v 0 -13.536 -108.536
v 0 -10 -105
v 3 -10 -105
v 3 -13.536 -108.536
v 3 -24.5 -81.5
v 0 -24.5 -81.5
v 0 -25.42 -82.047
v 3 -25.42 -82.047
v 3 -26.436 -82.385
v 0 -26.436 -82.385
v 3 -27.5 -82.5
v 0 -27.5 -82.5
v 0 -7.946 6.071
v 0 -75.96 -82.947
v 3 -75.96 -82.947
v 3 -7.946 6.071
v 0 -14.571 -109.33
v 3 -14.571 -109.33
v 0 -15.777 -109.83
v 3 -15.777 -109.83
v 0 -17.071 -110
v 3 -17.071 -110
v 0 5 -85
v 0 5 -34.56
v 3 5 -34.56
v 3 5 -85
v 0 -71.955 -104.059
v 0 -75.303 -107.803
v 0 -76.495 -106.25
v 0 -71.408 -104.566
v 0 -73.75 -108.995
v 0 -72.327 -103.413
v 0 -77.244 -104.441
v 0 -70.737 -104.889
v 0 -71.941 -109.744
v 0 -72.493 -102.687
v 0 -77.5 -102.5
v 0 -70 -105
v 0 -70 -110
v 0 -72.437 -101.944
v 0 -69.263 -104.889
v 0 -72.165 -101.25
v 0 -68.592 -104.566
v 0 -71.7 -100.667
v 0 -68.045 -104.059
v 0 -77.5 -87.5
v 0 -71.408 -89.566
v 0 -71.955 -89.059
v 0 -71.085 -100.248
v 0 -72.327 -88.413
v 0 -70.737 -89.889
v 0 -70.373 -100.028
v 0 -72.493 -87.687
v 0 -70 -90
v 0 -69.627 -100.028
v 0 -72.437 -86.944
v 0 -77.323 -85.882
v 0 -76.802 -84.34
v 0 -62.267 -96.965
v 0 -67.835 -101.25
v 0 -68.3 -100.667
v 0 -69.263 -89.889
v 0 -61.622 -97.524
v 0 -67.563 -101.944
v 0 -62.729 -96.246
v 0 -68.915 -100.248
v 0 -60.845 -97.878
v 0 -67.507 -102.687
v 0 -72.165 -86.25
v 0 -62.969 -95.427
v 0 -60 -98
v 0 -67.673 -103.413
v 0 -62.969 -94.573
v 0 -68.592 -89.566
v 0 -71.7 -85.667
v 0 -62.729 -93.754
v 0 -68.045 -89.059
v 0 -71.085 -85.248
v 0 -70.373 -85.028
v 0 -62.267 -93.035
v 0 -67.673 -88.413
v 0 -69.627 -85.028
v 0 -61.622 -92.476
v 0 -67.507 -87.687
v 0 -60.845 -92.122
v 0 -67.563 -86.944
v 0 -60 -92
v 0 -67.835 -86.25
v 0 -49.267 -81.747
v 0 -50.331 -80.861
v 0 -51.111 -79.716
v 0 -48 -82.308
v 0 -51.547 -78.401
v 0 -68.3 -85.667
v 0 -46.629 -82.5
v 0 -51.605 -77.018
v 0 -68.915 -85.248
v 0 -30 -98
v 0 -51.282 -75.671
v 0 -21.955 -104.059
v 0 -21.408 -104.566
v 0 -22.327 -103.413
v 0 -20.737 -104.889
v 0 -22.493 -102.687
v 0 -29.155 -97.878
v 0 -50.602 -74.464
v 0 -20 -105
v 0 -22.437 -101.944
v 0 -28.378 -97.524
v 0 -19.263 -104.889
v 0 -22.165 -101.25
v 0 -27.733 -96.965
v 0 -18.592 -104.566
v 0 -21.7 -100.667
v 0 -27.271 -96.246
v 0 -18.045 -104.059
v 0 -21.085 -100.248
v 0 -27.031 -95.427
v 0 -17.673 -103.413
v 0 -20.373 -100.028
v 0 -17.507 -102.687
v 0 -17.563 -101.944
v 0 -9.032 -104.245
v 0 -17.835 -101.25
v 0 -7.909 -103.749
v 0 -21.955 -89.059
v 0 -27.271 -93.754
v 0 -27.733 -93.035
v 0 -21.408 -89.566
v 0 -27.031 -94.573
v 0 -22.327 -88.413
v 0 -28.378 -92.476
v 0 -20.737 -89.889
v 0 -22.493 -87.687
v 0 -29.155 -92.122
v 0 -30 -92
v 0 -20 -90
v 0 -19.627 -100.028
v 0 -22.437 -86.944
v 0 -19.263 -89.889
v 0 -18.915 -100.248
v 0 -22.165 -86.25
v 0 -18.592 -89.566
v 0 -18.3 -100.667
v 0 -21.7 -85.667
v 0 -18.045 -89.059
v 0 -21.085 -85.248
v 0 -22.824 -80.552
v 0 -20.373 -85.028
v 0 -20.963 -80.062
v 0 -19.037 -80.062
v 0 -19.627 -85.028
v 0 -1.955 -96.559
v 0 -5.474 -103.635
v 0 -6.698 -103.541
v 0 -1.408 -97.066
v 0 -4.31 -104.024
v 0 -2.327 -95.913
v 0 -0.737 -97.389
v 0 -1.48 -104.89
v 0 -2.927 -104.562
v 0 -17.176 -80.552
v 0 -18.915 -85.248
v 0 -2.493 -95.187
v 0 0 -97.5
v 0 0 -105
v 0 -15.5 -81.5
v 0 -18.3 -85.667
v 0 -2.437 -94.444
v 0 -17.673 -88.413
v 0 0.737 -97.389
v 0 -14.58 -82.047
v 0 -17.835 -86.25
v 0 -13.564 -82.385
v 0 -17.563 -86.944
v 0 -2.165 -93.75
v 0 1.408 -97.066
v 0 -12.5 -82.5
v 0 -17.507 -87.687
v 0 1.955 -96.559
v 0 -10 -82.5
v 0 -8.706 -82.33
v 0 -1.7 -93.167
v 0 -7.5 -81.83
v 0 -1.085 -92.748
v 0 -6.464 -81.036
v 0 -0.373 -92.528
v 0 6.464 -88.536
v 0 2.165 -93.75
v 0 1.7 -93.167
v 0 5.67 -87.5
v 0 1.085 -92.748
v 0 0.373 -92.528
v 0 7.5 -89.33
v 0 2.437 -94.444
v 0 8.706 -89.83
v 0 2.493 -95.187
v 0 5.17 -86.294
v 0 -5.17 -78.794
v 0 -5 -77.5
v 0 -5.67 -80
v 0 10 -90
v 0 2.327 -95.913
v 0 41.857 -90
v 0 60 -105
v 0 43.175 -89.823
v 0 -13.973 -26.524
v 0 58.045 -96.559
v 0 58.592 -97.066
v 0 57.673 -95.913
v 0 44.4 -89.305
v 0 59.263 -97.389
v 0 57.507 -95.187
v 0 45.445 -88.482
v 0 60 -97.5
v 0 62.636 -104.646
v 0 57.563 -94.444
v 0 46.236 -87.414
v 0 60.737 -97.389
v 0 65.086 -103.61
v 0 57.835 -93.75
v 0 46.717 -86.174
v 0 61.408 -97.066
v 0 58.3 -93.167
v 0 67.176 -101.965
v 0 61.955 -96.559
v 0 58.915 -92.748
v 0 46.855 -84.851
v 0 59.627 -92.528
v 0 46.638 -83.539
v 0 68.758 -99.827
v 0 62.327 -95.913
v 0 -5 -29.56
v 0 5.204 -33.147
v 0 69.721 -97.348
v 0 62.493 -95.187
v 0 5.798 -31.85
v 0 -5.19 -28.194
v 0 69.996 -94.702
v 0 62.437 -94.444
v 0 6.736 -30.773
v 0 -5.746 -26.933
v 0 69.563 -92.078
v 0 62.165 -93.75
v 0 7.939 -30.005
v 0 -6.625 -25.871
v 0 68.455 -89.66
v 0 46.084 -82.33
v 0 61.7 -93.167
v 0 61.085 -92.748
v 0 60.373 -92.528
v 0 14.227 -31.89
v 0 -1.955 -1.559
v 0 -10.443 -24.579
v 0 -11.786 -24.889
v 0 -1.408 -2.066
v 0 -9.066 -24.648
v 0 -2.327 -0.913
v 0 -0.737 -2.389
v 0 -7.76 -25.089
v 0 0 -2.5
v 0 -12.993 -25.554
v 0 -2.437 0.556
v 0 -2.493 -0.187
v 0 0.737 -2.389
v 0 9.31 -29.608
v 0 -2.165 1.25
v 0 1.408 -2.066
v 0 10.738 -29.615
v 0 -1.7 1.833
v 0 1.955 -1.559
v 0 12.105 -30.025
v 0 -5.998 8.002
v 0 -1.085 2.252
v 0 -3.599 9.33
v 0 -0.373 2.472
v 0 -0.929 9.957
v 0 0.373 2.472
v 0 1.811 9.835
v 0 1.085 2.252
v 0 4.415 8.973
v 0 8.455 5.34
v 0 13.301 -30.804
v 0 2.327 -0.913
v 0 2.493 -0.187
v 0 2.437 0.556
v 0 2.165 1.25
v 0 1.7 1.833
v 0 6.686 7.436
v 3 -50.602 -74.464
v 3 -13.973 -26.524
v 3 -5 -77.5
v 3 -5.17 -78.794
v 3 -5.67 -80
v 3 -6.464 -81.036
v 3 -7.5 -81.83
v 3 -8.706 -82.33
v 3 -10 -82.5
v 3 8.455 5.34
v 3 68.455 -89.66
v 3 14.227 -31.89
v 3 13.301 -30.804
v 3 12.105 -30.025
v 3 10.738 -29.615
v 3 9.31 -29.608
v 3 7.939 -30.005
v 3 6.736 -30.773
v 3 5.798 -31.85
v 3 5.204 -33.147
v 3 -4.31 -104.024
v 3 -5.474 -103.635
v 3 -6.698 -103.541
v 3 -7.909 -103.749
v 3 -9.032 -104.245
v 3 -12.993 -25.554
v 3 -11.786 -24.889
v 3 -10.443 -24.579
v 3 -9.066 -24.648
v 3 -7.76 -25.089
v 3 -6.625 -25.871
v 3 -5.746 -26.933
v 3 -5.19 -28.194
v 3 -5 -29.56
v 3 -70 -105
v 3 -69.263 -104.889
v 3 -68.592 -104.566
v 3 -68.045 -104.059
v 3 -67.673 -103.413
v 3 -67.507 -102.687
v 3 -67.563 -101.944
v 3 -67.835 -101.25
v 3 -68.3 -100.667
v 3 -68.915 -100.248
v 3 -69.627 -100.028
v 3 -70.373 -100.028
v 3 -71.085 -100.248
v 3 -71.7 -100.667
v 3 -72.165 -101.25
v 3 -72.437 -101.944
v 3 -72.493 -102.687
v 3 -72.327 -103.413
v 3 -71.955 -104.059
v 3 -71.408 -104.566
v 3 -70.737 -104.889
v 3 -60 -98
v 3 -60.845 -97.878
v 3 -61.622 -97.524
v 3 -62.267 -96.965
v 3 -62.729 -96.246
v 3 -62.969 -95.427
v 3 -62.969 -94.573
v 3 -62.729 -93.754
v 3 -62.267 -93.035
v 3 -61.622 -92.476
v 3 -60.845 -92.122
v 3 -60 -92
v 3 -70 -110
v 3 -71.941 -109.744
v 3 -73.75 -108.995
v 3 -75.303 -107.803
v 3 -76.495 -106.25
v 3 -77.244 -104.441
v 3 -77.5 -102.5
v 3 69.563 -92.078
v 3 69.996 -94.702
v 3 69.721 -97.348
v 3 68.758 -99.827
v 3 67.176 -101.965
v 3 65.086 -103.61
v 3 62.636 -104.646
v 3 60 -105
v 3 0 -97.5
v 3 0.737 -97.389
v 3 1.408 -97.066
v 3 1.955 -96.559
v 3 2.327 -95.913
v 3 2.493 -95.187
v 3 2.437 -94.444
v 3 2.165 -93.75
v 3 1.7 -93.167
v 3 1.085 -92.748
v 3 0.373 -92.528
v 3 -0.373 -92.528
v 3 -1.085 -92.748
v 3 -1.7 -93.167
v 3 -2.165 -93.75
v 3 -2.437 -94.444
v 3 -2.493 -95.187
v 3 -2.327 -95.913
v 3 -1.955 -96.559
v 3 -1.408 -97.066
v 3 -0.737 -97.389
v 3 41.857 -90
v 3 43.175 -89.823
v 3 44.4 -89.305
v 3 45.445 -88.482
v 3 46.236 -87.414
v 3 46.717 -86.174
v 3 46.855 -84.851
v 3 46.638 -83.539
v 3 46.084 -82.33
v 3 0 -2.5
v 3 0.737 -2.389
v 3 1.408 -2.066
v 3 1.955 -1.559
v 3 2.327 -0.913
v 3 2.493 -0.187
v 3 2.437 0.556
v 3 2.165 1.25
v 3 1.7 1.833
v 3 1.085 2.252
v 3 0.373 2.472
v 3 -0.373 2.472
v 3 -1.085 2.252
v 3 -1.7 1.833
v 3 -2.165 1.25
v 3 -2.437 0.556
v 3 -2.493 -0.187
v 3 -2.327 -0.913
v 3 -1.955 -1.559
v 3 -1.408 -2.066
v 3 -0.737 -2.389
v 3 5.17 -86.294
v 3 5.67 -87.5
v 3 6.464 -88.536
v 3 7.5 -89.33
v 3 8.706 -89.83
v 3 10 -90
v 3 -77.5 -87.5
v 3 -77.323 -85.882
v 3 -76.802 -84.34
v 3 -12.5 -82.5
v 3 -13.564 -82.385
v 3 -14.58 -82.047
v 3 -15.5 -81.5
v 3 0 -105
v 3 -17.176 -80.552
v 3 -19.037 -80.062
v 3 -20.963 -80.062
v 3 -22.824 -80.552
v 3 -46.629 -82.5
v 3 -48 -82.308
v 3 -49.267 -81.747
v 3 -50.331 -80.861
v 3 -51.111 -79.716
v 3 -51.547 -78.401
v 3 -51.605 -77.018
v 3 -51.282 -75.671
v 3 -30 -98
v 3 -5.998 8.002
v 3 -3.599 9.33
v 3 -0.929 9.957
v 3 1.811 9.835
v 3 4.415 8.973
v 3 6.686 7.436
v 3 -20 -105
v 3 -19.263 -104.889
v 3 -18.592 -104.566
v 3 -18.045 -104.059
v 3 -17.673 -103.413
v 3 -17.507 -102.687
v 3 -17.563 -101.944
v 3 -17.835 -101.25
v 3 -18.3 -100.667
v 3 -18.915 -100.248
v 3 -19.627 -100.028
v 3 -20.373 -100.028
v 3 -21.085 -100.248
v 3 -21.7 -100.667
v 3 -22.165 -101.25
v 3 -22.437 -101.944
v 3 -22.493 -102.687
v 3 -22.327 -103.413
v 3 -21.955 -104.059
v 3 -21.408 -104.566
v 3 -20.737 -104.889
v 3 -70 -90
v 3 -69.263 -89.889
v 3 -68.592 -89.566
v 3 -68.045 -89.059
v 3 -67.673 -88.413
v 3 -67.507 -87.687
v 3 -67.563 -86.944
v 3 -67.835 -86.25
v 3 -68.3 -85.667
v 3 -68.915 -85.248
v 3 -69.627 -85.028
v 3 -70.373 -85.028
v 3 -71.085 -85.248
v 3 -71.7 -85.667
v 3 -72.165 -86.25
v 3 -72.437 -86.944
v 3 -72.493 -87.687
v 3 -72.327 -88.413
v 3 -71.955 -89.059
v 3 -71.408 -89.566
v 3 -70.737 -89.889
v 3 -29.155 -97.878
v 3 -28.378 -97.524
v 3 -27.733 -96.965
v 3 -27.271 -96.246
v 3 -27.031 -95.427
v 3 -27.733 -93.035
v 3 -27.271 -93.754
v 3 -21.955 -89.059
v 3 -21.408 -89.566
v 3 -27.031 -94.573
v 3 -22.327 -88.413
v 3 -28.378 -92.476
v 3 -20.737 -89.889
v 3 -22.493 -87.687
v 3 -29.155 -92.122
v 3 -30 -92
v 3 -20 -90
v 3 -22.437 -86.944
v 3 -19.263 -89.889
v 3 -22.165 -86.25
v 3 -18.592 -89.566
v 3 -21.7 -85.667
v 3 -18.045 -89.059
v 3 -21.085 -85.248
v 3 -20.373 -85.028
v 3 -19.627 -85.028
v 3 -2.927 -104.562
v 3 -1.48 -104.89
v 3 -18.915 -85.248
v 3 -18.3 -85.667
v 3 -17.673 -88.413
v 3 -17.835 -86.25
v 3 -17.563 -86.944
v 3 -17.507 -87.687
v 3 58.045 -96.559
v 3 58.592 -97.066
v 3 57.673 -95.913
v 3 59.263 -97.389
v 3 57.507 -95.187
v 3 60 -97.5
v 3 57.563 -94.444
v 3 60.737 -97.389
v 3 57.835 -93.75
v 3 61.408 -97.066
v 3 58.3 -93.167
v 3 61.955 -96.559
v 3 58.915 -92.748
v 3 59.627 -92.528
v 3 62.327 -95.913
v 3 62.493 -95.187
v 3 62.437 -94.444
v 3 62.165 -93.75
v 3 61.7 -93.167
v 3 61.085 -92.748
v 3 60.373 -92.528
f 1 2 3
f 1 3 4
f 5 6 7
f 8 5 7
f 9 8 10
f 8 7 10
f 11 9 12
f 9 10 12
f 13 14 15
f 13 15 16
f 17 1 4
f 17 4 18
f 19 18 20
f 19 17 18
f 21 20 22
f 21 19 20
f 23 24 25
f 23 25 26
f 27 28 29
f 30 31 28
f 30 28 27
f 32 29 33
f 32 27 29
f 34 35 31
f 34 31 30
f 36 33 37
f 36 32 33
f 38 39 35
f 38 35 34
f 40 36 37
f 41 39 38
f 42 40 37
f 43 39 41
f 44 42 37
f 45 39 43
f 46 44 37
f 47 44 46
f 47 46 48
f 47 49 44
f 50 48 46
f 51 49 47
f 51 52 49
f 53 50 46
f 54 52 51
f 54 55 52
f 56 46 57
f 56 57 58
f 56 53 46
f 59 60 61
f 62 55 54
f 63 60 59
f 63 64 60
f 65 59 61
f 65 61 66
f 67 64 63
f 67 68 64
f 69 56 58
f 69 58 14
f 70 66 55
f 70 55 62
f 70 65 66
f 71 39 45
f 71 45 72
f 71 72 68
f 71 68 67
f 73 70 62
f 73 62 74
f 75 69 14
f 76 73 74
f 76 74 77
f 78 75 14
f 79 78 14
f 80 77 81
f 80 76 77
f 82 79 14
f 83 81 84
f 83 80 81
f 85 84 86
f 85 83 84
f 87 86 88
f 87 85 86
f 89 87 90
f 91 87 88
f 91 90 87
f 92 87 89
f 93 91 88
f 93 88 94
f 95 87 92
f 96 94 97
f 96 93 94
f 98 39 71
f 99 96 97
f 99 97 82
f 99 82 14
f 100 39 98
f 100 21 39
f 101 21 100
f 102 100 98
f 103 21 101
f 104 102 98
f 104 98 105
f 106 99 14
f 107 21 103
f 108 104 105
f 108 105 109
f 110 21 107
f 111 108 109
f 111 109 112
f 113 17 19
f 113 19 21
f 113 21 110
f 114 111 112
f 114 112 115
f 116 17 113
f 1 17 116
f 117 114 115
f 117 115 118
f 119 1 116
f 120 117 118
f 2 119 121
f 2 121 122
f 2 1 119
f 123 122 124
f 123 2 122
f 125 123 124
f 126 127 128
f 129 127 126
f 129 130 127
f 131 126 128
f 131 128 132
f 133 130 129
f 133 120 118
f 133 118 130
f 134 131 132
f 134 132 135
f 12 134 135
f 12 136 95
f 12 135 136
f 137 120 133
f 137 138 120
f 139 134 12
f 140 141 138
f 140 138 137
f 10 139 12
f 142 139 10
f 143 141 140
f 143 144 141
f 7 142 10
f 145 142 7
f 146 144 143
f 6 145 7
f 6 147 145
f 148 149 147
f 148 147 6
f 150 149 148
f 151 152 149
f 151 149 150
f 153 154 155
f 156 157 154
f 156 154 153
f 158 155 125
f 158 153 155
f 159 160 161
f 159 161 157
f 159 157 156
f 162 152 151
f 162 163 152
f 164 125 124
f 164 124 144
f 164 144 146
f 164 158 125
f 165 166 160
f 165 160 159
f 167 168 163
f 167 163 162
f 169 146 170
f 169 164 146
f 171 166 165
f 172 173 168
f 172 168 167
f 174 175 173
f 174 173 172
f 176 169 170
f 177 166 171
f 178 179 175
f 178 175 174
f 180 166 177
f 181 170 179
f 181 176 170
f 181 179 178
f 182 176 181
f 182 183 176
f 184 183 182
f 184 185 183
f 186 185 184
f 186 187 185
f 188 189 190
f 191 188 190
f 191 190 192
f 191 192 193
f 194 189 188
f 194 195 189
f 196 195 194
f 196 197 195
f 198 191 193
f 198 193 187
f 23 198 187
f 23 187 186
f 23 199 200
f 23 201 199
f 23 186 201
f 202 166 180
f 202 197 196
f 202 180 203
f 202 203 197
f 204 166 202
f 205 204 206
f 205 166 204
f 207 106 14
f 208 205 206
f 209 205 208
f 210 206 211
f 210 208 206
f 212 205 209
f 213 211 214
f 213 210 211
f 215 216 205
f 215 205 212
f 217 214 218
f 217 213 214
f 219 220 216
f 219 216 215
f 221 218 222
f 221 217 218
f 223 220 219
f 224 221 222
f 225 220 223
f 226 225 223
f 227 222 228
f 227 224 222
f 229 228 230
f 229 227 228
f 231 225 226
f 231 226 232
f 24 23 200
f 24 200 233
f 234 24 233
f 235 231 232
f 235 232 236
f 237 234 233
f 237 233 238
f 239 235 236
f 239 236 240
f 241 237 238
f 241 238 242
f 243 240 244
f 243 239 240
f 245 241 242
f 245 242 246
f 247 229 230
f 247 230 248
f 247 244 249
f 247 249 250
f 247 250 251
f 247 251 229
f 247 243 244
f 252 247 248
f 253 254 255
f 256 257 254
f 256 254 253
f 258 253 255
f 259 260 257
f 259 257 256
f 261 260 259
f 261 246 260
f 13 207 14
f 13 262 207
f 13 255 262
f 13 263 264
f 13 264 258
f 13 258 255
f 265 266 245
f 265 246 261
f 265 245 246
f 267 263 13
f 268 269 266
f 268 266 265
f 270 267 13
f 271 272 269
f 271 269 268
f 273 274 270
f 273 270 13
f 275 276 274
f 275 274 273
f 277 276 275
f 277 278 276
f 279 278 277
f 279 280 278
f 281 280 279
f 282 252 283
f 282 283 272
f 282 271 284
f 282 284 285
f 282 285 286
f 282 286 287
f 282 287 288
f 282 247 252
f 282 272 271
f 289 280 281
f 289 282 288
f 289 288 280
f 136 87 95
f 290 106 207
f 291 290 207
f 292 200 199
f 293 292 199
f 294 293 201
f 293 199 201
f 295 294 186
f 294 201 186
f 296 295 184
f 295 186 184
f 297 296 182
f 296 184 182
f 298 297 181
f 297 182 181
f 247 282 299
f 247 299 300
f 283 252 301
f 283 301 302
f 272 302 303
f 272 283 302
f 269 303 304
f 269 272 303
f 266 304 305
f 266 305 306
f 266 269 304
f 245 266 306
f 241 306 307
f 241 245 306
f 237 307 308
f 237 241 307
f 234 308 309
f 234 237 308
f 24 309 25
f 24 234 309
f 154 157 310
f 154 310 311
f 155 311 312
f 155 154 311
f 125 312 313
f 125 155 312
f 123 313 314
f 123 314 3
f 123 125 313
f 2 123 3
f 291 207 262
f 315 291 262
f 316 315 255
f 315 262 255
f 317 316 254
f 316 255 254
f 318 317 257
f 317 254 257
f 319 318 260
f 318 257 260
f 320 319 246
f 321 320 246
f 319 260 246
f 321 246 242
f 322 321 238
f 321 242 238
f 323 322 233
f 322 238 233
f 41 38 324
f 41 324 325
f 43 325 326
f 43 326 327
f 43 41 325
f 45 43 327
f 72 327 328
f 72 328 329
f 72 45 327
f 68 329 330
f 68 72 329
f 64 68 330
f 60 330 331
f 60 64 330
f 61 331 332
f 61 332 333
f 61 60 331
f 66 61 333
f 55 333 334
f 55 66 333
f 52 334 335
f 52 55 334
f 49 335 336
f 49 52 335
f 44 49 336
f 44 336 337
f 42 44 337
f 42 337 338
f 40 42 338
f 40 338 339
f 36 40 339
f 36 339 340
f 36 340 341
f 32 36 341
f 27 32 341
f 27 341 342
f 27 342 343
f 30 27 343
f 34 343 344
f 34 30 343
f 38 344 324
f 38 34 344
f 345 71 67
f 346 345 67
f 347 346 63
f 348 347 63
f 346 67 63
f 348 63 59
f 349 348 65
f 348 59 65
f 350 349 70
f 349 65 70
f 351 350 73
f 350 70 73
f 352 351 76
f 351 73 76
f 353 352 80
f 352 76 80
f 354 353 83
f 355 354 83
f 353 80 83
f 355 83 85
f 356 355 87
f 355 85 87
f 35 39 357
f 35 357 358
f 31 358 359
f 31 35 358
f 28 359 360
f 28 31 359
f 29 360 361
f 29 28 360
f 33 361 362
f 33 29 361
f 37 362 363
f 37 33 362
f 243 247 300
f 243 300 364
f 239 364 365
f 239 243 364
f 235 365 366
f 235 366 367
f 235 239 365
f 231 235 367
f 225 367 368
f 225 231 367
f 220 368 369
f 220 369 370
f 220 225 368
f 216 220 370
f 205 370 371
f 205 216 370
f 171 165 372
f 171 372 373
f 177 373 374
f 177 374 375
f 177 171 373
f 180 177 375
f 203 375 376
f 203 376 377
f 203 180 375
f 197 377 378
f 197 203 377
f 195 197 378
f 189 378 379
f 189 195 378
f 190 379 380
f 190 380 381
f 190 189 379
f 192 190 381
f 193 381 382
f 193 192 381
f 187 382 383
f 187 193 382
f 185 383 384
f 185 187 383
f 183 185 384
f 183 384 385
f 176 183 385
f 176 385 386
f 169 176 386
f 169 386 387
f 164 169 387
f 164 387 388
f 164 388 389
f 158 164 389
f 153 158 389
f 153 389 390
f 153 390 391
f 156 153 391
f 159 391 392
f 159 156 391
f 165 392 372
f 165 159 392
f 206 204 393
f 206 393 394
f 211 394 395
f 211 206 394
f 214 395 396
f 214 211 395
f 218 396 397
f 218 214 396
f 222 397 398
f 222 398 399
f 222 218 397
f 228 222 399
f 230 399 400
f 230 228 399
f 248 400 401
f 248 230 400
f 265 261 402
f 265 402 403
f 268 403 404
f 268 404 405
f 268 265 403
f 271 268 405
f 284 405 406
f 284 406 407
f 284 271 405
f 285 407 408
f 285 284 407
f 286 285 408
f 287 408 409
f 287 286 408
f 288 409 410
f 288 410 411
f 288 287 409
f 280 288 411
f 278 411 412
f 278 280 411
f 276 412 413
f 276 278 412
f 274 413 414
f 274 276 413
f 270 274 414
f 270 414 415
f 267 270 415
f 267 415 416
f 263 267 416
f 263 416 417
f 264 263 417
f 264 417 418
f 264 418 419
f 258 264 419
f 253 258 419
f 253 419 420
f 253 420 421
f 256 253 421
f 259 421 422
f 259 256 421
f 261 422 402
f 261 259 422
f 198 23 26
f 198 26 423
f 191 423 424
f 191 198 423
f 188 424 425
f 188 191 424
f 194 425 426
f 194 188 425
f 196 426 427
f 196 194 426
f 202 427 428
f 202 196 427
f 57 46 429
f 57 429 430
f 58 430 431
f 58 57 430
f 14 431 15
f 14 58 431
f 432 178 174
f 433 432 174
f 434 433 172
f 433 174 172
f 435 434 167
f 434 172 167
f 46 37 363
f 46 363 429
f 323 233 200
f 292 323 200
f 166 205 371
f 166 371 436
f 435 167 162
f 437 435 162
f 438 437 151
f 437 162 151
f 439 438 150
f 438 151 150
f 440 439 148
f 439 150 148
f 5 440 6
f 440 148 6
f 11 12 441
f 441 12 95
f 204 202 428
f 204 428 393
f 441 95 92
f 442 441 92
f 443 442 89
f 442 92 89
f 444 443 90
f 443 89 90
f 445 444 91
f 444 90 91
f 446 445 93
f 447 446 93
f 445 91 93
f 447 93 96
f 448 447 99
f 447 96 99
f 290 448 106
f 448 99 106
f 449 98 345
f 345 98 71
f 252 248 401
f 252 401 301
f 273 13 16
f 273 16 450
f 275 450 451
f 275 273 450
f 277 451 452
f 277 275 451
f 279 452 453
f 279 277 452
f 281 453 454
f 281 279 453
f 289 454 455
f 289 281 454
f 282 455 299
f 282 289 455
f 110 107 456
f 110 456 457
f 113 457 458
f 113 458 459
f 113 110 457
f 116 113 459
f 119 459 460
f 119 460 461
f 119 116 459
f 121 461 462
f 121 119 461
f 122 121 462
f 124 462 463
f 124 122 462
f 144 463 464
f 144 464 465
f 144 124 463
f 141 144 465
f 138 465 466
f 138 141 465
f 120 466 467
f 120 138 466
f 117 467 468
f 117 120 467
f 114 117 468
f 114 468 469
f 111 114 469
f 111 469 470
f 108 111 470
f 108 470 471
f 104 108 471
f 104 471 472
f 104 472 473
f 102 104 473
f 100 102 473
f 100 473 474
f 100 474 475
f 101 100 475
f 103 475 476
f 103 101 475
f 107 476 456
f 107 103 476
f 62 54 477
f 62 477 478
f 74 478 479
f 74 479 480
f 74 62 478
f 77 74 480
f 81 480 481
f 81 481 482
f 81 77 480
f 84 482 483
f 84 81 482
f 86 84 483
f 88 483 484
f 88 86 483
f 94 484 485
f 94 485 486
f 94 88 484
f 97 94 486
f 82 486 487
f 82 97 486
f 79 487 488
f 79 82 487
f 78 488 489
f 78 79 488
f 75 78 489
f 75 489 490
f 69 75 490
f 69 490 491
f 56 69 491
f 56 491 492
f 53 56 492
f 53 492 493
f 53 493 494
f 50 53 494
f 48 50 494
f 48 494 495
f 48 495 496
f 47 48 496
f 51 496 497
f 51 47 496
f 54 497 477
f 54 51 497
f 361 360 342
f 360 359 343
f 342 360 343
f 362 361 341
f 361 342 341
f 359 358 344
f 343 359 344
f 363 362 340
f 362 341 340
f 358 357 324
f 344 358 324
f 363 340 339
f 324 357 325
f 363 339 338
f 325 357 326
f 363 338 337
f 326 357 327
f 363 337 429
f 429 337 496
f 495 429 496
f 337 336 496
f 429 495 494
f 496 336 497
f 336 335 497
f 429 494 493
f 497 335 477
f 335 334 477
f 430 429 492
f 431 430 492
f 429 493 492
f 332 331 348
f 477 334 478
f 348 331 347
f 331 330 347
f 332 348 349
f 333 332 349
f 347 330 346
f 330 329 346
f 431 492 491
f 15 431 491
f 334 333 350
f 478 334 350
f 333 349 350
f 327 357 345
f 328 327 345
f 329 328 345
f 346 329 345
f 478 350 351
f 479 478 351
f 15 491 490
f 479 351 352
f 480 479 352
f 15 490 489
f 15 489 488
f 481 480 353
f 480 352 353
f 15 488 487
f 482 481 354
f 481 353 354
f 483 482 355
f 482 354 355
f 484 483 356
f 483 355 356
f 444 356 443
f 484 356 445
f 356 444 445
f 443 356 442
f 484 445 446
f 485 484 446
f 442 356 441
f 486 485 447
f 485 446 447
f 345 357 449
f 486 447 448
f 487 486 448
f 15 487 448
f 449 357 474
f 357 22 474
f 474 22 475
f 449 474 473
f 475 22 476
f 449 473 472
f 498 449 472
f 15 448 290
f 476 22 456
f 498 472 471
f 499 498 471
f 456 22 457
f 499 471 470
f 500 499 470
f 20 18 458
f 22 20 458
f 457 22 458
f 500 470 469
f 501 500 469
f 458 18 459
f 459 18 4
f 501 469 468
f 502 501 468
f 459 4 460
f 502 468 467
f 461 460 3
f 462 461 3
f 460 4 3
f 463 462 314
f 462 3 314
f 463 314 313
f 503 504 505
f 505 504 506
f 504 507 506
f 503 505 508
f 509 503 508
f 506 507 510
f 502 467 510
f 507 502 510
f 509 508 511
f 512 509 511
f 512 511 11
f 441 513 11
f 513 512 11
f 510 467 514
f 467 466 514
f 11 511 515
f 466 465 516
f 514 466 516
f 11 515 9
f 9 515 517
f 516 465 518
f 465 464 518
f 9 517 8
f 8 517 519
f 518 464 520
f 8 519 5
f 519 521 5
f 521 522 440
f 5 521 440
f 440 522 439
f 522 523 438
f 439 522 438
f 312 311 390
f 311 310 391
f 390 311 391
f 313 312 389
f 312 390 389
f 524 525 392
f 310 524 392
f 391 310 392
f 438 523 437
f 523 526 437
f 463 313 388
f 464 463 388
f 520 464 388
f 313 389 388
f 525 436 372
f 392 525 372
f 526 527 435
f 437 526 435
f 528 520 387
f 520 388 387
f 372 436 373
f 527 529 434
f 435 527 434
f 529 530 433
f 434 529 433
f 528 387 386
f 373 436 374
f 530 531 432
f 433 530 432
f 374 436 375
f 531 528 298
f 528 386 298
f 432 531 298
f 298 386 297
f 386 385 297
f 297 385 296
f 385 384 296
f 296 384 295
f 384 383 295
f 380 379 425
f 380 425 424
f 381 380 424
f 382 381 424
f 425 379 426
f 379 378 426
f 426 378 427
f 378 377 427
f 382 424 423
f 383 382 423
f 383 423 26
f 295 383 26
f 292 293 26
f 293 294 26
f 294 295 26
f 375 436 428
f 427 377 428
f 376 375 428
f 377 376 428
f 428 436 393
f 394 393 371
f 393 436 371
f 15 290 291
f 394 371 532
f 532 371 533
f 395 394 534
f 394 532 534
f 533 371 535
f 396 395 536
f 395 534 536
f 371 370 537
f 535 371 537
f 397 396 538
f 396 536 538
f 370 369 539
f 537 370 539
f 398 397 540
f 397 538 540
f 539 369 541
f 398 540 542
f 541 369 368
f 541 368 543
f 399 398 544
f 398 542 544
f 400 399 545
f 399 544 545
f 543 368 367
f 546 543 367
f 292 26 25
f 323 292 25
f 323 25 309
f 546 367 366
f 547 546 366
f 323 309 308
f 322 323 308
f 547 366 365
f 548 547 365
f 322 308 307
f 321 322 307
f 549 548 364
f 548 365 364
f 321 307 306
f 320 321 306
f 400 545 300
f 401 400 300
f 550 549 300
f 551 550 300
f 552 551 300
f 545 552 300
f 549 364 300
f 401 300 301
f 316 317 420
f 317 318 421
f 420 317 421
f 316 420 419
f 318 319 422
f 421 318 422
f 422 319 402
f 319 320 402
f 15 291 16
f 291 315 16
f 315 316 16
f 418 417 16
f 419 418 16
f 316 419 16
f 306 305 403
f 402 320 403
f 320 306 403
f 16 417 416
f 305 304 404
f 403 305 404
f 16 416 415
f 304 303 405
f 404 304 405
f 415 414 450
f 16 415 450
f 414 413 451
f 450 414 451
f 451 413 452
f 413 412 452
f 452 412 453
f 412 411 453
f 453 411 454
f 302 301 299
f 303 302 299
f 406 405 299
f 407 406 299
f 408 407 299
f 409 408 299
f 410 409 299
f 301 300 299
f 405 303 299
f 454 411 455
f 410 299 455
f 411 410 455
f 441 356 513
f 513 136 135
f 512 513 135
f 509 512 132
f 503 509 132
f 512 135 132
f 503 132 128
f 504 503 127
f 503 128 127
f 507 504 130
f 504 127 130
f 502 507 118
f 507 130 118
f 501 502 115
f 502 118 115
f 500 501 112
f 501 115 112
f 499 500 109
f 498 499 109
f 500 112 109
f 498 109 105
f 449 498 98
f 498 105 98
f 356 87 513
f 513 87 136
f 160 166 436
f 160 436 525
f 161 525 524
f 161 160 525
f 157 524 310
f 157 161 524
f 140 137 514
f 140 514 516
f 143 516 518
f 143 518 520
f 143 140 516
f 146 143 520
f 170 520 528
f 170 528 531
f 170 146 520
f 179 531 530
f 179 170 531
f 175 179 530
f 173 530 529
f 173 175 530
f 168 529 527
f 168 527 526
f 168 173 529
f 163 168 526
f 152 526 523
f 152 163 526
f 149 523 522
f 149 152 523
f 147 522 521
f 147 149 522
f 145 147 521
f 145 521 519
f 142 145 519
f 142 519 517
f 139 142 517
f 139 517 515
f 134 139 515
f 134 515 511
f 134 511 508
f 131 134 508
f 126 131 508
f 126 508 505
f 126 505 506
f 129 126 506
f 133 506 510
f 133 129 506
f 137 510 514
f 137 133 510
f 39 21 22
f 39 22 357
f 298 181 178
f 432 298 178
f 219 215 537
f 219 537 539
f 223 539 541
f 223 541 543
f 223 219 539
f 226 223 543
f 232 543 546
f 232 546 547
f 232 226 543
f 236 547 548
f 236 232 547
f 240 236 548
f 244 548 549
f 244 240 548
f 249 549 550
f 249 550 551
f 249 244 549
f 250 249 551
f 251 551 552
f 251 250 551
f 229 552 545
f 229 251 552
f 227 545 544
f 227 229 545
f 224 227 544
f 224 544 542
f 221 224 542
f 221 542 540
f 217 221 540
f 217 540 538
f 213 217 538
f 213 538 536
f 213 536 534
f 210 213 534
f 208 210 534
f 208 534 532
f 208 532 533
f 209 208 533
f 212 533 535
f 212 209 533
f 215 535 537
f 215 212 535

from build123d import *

# Parameters (mm, degrees)
SKETCH_1_R      = 2.5
EXTRUDE_1_DEPTH = 3


with BuildPart() as part:
    # 草图1 → 凸台-拉伸1 (new body)
    with BuildSketch(Plane(origin=(0, 0, 0), x_dir=(0, 0, -1), z_dir=(1, 0, 0))):
        with BuildLine():
            Line((-5.339929914, 8.45488903), (89.660070086, 68.45488903))
            ThreePointArc((89.660070086, 68.45488903), (99.827043653, 68.757833612), (105, 60))
            Line((105, 60), (105, 0))
            ThreePointArc((105, 0), (104.752868622, -2.209423827), (104.023689271, -4.309644063))
            ThreePointArc((104.023689271, -4.309644063), (103.607541108, -7.309975988), (105, -10))
            Line((105, -10), (108.535533906, -13.535533906))
            ThreePointArc((108.535533906, -13.535533906), (109.619397663, -15.15765065), (110, -17.071067812))
            Line((110, -17.071067812), (110, -70))
            ThreePointArc((110, -70), (107.803300859, -75.303300859), (102.5, -77.5))
            Line((102.5, -77.5), (87.5, -77.5))
            ThreePointArc((87.5, -77.5), (85.096555547, -77.10446724), (82.946615365, -75.959587936))
            Line((82.946615365, -75.959587936), (-6.071179513, -7.946117248))
            ThreePointArc((-6.071179513, -7.946117248), (-9.990075391, 0.44541405), (-5.339929914, 8.45488903))
        make_face()
        Circle(SKETCH_1_R, mode=Mode.SUBTRACT)
        with Locations((95, 0)):
            Circle(SKETCH_1_R, mode=Mode.SUBTRACT)
        with Locations((95, 60)):
            Circle(SKETCH_1_R, mode=Mode.SUBTRACT)
        with Locations((87.5, -20)):
            Circle(SKETCH_1_R, mode=Mode.SUBTRACT)
        with Locations((102.5, -20)):
            Circle(SKETCH_1_R, mode=Mode.SUBTRACT)
        with Locations((87.5, -70)):
            Circle(SKETCH_1_R, mode=Mode.SUBTRACT)
        with Locations((102.5, -70)):
            Circle(SKETCH_1_R, mode=Mode.SUBTRACT)
        with BuildLine():
            Line((82.330035043, 46.084178697), (31.890205922, 14.227444515))
            ThreePointArc((31.890205922, 14.227444515), (29.757191461, 8.610255883), (34.560170879, 5))
            Line((34.560170879, 5), (85, 5))
            ThreePointArc((85, 5), (88.535533906, 6.464466094), (90, 10))
            Line((90, 10), (90, 41.856734182))
            ThreePointArc((90, 41.856734182), (87.413521827, 46.235650988), (82.330035043, 46.084178697))
        make_face(mode=Mode.SUBTRACT)
        with BuildLine():
            Line((29.559523335, -5), (77.5, -5))
            ThreePointArc((77.5, -5), (81.035533906, -6.464466094), (82.5, -10))
            Line((82.5, -10), (82.5, -12.5))
            ThreePointArc((82.5, -12.5), (82.24341649, -14.08113883), (81.5, -15.5))
            ThreePointArc((81.5, -15.5), (80, -20), (81.5, -24.5))
            ThreePointArc((81.5, -24.5), (82.24341649, -25.91886117), (82.5, -27.5))
            Line((82.5, -27.5), (82.5, -46.628611267))
            ThreePointArc((82.5, -46.628611267), (79.716083394, -51.110683822), (74.464410244, -50.601669891))
            Line((74.464410244, -50.601669891), (26.523933579, -13.973058624))
            ThreePointArc((26.523933579, -13.973058624), (24.823211842, -8.397703698), (29.559523335, -5))
        make_face(mode=Mode.SUBTRACT)
        with BuildLine():
            Line((98, -30), (98, -60))
            ThreePointArc((98, -60), (95, -63), (92, -60))
            Line((92, -60), (92, -30))
            ThreePointArc((92, -30), (95, -27), (98, -30))
        make_face(mode=Mode.SUBTRACT)
    extrude(amount=EXTRUDE_1_DEPTH)


solid = part.part
